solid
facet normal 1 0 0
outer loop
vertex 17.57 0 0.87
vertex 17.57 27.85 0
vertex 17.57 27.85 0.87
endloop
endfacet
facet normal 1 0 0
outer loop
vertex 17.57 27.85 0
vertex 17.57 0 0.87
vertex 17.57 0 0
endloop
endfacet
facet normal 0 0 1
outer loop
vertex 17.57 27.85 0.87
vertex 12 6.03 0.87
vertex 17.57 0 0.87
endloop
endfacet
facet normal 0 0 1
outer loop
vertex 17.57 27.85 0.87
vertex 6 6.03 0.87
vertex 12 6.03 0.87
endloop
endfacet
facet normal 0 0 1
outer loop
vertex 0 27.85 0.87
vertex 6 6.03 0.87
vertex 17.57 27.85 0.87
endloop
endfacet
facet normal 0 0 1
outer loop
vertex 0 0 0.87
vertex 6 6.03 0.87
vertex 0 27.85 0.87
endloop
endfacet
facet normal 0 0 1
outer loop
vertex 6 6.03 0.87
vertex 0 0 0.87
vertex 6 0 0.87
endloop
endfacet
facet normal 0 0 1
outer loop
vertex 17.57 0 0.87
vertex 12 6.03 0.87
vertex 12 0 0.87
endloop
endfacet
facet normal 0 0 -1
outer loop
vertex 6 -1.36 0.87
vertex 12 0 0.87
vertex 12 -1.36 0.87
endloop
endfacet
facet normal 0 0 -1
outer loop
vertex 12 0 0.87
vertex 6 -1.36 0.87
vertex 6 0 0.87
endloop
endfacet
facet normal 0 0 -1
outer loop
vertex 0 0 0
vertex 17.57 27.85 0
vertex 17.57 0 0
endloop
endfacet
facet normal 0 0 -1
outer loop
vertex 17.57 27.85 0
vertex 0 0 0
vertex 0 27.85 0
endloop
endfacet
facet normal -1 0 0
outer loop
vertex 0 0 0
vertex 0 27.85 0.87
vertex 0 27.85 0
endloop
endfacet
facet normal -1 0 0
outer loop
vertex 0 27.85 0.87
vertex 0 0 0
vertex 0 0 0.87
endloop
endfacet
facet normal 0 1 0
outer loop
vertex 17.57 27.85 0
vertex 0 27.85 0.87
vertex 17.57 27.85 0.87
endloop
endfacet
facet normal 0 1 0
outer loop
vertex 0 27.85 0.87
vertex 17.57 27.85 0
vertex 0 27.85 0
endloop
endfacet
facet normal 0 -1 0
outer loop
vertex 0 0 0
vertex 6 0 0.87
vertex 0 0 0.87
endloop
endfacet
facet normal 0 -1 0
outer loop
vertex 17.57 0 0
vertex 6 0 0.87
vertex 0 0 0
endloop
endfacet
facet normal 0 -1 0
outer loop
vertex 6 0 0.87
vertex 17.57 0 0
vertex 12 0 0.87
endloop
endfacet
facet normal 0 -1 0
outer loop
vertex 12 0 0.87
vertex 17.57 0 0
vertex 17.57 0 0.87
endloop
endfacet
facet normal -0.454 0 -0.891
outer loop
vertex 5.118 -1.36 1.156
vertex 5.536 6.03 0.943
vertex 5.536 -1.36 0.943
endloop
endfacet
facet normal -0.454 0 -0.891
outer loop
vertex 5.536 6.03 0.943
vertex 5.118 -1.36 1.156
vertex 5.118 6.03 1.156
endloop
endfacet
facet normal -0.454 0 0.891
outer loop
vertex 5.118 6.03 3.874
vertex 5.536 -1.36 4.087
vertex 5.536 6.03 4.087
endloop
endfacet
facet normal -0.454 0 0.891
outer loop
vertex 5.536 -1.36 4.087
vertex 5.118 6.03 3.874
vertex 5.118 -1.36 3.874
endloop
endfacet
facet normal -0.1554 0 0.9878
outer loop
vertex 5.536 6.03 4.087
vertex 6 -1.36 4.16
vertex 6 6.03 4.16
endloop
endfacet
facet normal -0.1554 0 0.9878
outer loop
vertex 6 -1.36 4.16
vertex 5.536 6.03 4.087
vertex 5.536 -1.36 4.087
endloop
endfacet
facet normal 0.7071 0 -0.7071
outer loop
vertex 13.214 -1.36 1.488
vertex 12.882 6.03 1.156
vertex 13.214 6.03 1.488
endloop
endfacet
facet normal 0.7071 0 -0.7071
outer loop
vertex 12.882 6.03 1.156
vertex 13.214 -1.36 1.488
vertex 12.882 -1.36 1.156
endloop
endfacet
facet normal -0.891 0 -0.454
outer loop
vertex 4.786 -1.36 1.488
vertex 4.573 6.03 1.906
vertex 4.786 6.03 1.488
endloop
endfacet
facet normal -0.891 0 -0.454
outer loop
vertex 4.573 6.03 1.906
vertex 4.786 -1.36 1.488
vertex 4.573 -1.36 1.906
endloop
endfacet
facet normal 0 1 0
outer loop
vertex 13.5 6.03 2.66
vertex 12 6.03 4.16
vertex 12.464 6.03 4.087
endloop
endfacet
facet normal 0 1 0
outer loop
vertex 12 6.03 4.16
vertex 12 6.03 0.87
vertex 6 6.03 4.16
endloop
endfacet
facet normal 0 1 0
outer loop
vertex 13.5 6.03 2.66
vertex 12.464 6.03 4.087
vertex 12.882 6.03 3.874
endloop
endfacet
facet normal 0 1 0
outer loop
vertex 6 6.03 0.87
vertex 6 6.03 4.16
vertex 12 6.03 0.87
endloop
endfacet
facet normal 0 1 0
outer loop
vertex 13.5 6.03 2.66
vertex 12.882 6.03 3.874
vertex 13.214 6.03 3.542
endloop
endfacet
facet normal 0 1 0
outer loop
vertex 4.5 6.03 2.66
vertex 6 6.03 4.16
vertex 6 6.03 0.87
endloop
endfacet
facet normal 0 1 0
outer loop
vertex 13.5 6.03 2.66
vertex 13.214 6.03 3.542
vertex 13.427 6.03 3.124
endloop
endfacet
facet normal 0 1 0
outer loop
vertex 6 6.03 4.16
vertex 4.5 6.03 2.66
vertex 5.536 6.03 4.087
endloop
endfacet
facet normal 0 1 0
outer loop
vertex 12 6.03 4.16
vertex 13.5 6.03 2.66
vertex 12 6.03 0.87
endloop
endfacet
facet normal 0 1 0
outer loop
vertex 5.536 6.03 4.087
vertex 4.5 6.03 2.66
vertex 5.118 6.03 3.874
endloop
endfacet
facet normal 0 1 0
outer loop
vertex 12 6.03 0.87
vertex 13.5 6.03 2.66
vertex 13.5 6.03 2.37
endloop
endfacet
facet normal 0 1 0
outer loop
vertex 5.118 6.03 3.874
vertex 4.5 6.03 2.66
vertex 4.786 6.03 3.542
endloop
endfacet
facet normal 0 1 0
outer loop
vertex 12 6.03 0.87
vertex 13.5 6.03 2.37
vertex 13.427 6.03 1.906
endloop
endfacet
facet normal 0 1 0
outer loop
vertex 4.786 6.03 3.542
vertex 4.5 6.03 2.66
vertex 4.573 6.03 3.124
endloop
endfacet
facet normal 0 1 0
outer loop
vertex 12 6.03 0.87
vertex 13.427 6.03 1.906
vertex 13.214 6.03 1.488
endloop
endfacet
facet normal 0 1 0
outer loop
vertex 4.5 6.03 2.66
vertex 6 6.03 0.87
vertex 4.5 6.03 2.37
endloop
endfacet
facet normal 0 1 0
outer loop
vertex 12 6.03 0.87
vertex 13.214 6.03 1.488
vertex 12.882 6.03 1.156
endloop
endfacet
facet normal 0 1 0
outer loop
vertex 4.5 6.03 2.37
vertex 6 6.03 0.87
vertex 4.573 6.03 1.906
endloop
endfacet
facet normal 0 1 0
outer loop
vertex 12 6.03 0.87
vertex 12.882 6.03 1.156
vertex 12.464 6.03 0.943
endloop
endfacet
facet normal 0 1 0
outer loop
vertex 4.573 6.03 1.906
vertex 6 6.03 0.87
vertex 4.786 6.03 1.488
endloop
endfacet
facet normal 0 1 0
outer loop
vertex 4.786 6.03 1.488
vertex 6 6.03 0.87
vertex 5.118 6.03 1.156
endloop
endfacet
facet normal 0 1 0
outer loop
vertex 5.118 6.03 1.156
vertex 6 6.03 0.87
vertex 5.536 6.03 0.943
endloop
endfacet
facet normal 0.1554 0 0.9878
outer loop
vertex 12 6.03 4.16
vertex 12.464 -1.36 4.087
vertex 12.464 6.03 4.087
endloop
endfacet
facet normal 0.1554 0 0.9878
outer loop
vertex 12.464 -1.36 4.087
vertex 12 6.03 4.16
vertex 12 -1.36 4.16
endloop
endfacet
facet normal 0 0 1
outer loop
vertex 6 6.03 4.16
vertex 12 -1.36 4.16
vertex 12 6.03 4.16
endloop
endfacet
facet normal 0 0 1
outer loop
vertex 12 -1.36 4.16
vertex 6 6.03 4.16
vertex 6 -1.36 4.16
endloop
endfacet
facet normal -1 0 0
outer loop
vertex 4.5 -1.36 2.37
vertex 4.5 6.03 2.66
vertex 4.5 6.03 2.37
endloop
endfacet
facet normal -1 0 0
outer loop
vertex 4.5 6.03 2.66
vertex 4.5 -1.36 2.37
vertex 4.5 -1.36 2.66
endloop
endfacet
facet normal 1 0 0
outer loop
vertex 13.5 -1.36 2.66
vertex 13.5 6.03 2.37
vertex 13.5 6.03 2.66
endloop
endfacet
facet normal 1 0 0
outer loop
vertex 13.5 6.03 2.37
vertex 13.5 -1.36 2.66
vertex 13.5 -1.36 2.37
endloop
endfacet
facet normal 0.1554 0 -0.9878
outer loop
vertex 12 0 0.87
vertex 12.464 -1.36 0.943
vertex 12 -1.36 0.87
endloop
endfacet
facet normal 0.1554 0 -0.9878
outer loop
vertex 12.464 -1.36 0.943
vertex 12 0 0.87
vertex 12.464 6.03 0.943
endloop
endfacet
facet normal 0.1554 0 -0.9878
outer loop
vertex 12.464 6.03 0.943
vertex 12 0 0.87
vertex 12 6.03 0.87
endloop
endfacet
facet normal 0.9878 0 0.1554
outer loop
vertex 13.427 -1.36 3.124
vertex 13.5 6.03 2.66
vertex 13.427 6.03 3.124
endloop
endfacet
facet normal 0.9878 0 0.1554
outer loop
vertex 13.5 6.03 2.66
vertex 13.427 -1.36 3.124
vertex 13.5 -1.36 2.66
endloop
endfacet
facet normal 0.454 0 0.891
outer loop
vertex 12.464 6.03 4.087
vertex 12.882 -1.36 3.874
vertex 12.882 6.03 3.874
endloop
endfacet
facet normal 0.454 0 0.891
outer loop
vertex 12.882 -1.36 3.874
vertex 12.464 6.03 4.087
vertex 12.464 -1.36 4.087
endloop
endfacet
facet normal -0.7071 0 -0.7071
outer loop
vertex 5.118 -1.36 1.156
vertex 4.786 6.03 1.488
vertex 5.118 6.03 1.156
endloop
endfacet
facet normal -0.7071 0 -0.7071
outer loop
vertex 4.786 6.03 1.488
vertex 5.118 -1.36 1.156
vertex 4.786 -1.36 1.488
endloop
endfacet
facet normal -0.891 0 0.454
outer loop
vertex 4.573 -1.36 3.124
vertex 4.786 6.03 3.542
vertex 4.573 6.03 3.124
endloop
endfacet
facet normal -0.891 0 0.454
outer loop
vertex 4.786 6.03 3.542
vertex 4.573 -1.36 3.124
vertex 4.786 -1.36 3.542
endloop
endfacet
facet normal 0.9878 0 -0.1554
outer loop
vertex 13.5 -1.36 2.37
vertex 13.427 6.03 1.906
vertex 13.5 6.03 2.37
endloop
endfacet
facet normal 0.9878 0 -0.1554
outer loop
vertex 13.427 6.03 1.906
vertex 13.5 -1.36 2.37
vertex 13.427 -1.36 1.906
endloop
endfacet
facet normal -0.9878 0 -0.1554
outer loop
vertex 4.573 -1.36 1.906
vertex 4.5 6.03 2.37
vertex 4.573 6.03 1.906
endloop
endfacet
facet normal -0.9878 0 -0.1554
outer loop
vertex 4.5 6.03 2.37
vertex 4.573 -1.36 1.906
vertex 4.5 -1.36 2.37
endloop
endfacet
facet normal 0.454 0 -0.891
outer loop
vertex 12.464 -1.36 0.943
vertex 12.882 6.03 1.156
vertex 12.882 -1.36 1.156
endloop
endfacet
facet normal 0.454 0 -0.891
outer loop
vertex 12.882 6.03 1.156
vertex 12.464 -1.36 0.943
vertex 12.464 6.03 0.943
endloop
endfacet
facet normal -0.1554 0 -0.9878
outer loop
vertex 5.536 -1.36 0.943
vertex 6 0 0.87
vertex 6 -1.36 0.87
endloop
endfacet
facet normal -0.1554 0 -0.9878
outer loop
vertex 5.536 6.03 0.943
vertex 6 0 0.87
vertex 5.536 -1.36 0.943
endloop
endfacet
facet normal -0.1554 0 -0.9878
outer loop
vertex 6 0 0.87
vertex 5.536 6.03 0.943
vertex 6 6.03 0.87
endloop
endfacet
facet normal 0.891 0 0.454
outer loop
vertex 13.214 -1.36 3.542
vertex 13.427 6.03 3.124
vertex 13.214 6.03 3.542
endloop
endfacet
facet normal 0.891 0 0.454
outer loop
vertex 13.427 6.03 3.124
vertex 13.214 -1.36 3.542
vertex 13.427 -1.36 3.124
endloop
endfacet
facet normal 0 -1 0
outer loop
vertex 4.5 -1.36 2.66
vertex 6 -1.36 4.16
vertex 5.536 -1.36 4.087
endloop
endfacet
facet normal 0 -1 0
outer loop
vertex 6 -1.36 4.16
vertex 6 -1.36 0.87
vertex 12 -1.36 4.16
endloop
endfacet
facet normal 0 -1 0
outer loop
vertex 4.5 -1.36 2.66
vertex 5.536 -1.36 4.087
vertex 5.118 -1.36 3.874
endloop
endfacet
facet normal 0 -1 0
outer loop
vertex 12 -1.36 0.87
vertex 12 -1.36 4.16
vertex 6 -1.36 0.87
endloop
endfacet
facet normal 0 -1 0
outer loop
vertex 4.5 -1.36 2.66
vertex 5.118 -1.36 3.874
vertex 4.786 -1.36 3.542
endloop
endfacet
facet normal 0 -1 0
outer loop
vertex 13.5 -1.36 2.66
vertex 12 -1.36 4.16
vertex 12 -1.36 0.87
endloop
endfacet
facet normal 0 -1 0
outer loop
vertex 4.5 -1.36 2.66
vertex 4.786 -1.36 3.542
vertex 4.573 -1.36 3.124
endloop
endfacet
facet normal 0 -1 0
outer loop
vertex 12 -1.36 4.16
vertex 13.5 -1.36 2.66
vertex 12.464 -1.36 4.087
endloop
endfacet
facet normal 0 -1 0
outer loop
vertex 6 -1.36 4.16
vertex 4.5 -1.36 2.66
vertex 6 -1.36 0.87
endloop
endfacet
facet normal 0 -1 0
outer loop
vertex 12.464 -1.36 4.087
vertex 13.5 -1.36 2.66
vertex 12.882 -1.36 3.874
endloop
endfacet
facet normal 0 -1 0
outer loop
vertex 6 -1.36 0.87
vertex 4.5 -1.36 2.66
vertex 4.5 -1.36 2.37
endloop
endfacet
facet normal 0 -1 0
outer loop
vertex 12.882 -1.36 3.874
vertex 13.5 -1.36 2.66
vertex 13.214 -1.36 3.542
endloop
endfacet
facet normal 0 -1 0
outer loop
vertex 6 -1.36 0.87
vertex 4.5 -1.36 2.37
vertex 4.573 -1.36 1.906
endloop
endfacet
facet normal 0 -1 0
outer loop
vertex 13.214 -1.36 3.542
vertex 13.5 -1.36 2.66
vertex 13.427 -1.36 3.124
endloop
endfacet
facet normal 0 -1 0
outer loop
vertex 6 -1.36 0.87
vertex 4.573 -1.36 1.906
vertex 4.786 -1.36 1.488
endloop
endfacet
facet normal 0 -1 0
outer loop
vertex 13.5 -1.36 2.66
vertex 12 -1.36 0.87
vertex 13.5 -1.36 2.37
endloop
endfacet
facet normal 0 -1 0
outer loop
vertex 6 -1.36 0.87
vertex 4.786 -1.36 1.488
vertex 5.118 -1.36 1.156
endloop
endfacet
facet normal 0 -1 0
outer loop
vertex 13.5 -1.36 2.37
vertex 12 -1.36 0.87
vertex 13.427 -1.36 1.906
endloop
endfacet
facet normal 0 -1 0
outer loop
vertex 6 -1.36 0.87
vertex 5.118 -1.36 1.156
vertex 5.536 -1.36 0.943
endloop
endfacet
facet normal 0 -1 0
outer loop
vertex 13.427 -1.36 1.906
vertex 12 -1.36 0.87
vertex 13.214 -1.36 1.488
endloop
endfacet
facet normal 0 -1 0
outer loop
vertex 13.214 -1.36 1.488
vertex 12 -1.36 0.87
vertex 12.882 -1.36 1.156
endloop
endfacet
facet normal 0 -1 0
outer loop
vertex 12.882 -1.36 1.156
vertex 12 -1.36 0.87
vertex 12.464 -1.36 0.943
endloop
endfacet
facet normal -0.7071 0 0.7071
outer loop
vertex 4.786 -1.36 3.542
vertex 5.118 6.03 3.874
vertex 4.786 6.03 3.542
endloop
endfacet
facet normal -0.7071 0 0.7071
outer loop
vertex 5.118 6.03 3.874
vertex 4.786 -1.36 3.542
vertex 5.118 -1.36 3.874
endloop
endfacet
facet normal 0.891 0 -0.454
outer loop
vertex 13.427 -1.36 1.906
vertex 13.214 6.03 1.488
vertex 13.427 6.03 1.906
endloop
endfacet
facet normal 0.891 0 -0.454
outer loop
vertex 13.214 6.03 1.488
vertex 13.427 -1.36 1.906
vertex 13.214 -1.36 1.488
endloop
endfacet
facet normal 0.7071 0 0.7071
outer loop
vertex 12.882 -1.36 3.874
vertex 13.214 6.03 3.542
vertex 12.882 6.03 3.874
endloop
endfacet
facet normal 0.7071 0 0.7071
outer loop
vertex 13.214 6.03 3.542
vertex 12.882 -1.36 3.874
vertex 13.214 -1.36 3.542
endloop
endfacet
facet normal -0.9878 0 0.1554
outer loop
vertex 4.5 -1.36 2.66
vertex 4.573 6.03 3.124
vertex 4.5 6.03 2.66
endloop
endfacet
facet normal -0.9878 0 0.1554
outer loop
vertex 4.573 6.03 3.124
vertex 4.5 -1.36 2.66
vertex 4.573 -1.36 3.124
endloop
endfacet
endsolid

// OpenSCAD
// file: configurations.scad
usb_charger_asset_electronic_card_x_size = 17.57;
usb_charger_asset_electronic_card_y_size = 27.85;
usb_charger_asset_electronic_card_z_size = 0.87;
usb_charger_asset_usb_port_x_size = 9;
usb_charger_asset_usb_port_y_size = 7.39;
usb_charger_asset_usb_port_z_size = 3.29;
usb_charger_asset_usb_round_radius = 1.5;
usb_charger_asset_draw_rounded_usb = true;
usb_charger_asset_usb_port_x_offset = 4.5;
usb_charger_asset_usb_port_y_offset = -1.36;
usb_charger_asset_fn = 20;
// main file
include <./configurations.scad>

/**
 * usbCharger
 * @name usbCharger
 * @description Usb Li-Ion charger board
 * @type asset
 * @parent 
 */
module usbCharger(
    electronic_card_x_size = usb_charger_asset_electronic_card_x_size,
    electronic_card_y_size = usb_charger_asset_electronic_card_y_size,
    electronic_card_z_size = usb_charger_asset_electronic_card_z_size,
    usb_port_x_size = usb_charger_asset_usb_port_x_size,
    usb_port_y_size = usb_charger_asset_usb_port_y_size,
    usb_port_z_size = usb_charger_asset_usb_port_z_size,
    usb_round_radius = usb_charger_asset_usb_round_radius,
    draw_rounded_usb = usb_charger_asset_draw_rounded_usb,
    usb_port_x_offset = usb_charger_asset_usb_port_x_offset,
    usb_port_y_offset = usb_charger_asset_usb_port_y_offset,
    _fn = usb_charger_asset_fn
) {
    color("RoyalBlue")
        cube([
            electronic_card_x_size,
            electronic_card_y_size,
            electronic_card_z_size
        ]);

    if (draw_rounded_usb) {

        usb_edges_coords = [
            [
                usb_round_radius,
                usb_round_radius
            ],
            [
                usb_port_x_size - usb_round_radius,
                usb_round_radius
            ],
            [
                usb_port_x_size - usb_round_radius,
                usb_port_z_size - usb_round_radius
            ],
            [
                usb_round_radius,
                usb_port_z_size - usb_round_radius
            ],
        ];

        color("DarkGray")
            translate([
                usb_port_x_offset,
                usb_port_y_offset,
                electronic_card_z_size
            ])
                hull() {
                    for (edge = usb_edges_coords) {
                        translate([edge[0], 0, edge[1]])
                            rotate([-90,0,0])
                                cylinder(h = usb_port_y_size, r = usb_round_radius, $fn = _fn);
                    }
                }
    } else {

        color("DarkGray")
            translate([
                usb_port_x_offset,
                usb_port_y_offset,
                electronic_card_z_size
            ])
                cube([
                    usb_port_x_size,
                    usb_port_y_size,
                    usb_port_z_size
                ]);
    }
}

usbCharger();
